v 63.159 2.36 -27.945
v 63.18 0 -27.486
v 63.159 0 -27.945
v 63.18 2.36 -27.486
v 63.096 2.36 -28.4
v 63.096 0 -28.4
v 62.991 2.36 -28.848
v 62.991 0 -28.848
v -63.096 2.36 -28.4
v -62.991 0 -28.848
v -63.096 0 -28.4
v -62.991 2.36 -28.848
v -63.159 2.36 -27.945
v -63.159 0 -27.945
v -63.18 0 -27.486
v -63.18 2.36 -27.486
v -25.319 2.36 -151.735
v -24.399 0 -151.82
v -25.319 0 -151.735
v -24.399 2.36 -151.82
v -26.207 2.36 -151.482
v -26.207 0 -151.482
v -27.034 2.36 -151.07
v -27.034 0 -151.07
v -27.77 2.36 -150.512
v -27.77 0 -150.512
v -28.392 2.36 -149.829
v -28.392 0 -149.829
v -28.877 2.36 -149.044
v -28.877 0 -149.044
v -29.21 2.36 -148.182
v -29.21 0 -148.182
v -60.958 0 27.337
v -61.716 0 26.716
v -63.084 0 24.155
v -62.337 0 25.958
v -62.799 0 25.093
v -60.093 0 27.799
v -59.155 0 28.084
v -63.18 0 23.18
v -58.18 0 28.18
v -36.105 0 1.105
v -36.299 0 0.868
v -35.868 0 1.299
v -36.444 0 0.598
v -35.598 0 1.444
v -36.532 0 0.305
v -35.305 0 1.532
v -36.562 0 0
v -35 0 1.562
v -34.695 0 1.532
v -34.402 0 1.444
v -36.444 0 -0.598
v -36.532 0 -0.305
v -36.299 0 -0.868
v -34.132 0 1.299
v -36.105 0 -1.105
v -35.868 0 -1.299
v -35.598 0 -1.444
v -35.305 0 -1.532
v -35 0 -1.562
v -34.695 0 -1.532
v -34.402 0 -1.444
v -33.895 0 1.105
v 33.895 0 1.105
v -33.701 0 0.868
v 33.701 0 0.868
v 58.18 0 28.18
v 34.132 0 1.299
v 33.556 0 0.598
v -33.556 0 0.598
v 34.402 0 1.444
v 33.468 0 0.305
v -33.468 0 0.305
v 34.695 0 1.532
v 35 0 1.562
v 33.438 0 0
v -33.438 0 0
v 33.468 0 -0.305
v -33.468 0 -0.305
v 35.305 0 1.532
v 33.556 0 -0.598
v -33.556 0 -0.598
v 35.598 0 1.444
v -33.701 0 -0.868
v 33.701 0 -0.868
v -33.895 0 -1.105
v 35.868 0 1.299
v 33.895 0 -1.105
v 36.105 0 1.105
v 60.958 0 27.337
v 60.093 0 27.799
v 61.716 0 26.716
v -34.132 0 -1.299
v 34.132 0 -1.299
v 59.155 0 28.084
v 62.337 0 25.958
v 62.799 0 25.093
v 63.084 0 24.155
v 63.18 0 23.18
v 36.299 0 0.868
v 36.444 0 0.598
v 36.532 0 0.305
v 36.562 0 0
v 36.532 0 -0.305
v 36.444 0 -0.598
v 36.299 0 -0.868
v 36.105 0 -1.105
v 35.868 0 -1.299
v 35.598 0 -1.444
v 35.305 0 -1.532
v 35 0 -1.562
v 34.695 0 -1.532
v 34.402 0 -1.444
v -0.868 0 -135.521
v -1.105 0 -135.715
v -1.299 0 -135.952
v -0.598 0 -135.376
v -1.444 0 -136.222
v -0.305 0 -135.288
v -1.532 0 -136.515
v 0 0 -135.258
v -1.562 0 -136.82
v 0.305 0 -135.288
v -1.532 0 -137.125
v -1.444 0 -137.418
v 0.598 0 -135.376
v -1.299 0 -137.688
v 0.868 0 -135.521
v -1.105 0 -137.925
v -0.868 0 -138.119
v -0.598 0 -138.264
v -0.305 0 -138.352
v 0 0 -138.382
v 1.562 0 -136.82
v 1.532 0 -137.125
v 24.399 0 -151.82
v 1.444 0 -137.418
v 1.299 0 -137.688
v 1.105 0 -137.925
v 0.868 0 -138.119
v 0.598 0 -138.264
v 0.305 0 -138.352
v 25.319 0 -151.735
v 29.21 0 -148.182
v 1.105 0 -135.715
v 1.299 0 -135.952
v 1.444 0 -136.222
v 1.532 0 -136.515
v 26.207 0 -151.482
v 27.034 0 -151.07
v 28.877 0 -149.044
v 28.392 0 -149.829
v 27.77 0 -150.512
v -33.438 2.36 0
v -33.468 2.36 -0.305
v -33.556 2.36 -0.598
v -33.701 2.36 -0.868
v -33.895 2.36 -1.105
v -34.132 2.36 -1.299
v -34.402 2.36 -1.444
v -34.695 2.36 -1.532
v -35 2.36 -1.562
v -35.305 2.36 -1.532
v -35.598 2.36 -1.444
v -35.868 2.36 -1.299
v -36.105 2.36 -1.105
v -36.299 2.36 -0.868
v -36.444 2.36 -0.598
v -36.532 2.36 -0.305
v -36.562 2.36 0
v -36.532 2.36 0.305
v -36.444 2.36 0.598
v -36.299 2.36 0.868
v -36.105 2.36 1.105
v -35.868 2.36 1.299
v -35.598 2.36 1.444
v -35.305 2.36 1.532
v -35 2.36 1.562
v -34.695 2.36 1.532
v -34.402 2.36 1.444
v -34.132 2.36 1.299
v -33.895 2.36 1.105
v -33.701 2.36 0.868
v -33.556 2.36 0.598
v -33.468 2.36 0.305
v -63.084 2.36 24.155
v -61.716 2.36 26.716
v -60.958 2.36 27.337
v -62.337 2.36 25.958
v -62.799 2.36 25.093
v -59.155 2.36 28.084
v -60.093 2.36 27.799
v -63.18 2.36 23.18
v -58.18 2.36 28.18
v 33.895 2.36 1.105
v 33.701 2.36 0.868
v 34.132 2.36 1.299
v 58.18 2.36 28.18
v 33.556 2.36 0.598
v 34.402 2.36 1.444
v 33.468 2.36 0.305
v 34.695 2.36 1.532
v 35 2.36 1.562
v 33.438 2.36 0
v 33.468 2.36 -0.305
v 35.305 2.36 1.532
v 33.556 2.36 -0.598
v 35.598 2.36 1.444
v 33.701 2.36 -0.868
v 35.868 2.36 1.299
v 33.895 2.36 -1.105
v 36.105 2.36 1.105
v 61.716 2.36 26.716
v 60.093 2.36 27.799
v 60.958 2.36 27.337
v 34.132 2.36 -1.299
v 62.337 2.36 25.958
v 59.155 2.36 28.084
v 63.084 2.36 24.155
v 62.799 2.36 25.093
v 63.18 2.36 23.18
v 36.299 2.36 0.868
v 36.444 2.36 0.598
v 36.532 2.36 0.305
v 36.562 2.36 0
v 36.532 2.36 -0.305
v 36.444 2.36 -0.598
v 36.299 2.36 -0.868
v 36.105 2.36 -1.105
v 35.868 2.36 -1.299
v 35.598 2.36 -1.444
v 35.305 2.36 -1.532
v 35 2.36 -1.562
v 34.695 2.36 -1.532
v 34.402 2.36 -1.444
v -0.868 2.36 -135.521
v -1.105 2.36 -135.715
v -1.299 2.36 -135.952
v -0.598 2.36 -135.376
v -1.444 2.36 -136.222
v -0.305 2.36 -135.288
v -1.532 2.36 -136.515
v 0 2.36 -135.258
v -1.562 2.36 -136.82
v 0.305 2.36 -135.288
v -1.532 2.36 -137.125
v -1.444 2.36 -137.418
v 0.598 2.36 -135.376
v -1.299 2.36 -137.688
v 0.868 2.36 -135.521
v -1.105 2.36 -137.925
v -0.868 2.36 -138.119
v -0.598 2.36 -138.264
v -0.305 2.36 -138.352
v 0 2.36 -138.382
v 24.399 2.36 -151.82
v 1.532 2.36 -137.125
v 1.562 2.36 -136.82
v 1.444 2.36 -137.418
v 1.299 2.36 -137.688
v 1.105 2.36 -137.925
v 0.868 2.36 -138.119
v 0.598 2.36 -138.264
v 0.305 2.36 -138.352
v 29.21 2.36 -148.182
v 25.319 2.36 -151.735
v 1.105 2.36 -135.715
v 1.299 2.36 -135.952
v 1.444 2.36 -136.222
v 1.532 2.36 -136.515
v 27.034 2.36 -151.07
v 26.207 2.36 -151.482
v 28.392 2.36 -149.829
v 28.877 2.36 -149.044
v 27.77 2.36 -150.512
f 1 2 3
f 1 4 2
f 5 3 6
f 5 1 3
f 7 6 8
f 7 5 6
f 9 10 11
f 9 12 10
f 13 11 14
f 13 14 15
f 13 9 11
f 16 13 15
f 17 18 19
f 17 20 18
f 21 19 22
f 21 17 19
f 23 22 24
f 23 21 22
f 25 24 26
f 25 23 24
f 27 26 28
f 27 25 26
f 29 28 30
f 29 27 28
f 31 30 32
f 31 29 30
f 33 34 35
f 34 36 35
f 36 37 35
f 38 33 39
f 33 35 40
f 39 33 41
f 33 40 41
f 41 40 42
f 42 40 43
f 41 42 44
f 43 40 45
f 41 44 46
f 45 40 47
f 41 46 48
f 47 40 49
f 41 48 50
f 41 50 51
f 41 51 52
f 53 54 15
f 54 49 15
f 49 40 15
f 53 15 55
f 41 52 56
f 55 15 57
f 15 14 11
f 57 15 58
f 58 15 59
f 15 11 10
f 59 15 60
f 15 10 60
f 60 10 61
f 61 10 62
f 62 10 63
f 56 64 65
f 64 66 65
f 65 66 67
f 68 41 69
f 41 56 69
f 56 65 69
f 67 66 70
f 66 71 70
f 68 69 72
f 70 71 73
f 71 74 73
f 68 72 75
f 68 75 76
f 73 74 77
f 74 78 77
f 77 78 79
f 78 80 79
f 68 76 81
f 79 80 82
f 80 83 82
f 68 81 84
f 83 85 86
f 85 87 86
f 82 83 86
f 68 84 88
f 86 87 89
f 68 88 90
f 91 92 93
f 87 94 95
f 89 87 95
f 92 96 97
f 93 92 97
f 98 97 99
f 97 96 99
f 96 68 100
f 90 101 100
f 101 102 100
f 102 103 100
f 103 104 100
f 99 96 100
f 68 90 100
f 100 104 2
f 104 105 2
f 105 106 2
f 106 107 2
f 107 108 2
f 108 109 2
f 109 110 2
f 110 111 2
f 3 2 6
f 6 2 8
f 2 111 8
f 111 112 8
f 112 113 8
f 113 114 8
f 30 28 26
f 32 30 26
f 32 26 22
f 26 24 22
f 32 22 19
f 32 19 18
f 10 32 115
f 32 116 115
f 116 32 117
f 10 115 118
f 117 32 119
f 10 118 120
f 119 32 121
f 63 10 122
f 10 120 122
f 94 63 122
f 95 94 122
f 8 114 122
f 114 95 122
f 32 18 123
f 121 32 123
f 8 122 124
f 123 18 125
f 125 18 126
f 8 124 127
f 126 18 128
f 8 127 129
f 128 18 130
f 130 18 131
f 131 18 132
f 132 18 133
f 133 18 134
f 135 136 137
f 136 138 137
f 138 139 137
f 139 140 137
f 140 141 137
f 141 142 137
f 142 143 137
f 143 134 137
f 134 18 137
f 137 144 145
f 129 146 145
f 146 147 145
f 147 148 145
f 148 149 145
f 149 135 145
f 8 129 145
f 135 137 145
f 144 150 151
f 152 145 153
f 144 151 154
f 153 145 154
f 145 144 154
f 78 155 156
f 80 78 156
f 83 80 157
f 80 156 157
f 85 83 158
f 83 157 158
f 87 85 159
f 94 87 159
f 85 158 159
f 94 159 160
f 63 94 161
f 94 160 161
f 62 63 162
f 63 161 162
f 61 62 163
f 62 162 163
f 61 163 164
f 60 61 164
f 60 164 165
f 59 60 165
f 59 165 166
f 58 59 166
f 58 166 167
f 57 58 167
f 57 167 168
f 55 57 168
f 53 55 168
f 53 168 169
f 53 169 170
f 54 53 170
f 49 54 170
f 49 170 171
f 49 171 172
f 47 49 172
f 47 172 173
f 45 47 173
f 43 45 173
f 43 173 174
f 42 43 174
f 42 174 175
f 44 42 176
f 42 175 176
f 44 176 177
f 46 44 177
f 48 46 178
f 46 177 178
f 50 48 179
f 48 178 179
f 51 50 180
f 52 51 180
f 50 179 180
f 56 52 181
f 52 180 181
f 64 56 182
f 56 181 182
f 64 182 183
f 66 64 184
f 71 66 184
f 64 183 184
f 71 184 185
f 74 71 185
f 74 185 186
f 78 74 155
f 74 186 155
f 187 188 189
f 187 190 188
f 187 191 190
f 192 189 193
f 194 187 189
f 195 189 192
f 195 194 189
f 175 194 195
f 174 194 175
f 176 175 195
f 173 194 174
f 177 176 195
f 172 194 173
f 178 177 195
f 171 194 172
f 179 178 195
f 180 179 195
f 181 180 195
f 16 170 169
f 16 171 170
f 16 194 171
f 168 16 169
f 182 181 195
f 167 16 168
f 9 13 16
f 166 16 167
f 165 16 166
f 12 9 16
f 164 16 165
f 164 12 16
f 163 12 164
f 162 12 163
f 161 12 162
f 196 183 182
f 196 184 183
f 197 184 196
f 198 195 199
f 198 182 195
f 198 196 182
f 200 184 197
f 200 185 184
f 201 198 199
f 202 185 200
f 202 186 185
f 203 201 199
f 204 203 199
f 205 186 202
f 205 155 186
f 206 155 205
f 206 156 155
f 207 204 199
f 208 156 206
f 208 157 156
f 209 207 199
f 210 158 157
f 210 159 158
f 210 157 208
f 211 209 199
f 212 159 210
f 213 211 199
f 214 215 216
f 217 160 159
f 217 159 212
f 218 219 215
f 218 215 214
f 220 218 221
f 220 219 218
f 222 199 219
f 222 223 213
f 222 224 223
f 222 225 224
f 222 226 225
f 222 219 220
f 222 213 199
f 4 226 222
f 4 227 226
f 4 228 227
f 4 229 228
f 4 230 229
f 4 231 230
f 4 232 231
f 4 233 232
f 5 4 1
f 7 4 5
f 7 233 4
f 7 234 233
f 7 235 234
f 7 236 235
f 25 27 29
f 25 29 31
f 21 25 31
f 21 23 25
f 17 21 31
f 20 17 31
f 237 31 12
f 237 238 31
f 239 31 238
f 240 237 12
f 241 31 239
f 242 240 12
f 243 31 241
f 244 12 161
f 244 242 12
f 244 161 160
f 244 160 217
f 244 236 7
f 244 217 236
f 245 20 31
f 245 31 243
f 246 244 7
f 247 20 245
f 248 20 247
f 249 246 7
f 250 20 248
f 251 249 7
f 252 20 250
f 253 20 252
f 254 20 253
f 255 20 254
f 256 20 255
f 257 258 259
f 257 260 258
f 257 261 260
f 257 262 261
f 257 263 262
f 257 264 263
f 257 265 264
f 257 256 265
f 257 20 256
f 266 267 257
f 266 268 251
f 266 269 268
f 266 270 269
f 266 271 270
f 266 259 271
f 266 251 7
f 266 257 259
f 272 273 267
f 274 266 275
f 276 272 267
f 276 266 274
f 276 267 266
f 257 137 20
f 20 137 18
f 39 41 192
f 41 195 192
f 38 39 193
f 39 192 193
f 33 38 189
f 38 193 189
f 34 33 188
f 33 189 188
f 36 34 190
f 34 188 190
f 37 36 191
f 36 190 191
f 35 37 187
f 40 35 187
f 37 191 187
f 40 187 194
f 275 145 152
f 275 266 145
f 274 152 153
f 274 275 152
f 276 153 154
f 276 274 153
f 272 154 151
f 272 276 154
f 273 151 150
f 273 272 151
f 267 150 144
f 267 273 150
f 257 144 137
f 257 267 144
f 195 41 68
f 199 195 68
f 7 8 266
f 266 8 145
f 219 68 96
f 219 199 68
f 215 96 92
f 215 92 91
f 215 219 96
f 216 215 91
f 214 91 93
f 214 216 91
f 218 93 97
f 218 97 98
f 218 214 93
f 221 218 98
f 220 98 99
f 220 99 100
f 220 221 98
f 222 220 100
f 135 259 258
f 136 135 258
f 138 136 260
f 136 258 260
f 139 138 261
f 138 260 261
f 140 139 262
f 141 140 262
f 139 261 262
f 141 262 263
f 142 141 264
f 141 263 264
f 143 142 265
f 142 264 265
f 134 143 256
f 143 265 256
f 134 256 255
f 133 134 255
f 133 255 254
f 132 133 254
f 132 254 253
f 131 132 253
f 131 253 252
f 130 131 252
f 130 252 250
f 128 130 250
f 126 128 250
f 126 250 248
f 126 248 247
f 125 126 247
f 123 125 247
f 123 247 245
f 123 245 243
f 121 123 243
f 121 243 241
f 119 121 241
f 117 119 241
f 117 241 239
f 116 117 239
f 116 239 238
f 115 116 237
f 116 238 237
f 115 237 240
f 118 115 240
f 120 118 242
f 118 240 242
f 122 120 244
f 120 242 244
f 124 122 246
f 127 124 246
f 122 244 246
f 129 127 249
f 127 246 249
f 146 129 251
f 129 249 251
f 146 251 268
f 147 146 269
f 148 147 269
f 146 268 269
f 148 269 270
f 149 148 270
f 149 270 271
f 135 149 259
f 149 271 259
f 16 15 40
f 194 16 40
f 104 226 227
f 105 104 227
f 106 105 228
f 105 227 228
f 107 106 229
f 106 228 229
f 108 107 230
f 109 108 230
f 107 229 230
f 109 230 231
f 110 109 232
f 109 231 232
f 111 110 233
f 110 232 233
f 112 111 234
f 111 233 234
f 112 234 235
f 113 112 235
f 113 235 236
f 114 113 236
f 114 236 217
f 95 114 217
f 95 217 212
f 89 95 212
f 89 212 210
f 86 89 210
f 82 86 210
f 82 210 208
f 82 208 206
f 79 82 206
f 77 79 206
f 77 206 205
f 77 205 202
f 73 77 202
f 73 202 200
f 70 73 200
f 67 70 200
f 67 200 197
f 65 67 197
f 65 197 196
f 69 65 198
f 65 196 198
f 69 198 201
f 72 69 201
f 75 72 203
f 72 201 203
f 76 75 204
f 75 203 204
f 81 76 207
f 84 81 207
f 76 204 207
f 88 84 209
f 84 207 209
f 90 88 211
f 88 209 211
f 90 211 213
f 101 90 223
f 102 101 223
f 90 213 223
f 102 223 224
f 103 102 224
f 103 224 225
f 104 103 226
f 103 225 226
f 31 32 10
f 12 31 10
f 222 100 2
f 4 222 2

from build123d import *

# Parameters (mm, degrees)
BOSS_EXTRUDE1_DEPTH = 2.36
FILLET1_R           = 5
SKETCH4_R           = 1.5625
CUT_EXTRUDE1_DEPTH  = 3.36


with BuildPart() as part:
    # Sketch3 → Boss-Extrude1 (new body)
    with BuildSketch(Plane(origin=(0, 0, 0), x_dir=(1, 0, 0), z_dir=(0, 1, 0))):
        Polygon((-63.18, -28.18), (63.18, -28.18), (63.18, 28.18), (28.18, 151.82), (-28.18, 151.82), (-63.18, 28.18), align=None)
    extrude(amount=BOSS_EXTRUDE1_DEPTH)

    # Fillet1
    fillet1_edges = [part.edges().sort_by_distance(p)[0] for p in [
        (63.18, 1.18, -28.18),
        (63.18, 1.18, 28.18),
        (-63.18, 1.18, 28.18),
        (-63.18, 1.18, -28.18),
        (-28.18, 1.18, -151.82),
        (28.18, 1.18, -151.82),
    ]]
    fillet(fillet1_edges, radius=FILLET1_R)

    # Sketch4 → Cut-Extrude1 (cut, through all)
    with BuildSketch(Plane(origin=(0, 2.36, 0), x_dir=(1, 0, 0), z_dir=(0, 1, 0))):
        with Locations((-35, 0)):
            Circle(SKETCH4_R)
        with Locations((35, 0)):
            Circle(SKETCH4_R)
        with Locations((0, 136.82)):
            Circle(SKETCH4_R)
    extrude(amount=-CUT_EXTRUDE1_DEPTH, mode=Mode.SUBTRACT)


solid = part.part
